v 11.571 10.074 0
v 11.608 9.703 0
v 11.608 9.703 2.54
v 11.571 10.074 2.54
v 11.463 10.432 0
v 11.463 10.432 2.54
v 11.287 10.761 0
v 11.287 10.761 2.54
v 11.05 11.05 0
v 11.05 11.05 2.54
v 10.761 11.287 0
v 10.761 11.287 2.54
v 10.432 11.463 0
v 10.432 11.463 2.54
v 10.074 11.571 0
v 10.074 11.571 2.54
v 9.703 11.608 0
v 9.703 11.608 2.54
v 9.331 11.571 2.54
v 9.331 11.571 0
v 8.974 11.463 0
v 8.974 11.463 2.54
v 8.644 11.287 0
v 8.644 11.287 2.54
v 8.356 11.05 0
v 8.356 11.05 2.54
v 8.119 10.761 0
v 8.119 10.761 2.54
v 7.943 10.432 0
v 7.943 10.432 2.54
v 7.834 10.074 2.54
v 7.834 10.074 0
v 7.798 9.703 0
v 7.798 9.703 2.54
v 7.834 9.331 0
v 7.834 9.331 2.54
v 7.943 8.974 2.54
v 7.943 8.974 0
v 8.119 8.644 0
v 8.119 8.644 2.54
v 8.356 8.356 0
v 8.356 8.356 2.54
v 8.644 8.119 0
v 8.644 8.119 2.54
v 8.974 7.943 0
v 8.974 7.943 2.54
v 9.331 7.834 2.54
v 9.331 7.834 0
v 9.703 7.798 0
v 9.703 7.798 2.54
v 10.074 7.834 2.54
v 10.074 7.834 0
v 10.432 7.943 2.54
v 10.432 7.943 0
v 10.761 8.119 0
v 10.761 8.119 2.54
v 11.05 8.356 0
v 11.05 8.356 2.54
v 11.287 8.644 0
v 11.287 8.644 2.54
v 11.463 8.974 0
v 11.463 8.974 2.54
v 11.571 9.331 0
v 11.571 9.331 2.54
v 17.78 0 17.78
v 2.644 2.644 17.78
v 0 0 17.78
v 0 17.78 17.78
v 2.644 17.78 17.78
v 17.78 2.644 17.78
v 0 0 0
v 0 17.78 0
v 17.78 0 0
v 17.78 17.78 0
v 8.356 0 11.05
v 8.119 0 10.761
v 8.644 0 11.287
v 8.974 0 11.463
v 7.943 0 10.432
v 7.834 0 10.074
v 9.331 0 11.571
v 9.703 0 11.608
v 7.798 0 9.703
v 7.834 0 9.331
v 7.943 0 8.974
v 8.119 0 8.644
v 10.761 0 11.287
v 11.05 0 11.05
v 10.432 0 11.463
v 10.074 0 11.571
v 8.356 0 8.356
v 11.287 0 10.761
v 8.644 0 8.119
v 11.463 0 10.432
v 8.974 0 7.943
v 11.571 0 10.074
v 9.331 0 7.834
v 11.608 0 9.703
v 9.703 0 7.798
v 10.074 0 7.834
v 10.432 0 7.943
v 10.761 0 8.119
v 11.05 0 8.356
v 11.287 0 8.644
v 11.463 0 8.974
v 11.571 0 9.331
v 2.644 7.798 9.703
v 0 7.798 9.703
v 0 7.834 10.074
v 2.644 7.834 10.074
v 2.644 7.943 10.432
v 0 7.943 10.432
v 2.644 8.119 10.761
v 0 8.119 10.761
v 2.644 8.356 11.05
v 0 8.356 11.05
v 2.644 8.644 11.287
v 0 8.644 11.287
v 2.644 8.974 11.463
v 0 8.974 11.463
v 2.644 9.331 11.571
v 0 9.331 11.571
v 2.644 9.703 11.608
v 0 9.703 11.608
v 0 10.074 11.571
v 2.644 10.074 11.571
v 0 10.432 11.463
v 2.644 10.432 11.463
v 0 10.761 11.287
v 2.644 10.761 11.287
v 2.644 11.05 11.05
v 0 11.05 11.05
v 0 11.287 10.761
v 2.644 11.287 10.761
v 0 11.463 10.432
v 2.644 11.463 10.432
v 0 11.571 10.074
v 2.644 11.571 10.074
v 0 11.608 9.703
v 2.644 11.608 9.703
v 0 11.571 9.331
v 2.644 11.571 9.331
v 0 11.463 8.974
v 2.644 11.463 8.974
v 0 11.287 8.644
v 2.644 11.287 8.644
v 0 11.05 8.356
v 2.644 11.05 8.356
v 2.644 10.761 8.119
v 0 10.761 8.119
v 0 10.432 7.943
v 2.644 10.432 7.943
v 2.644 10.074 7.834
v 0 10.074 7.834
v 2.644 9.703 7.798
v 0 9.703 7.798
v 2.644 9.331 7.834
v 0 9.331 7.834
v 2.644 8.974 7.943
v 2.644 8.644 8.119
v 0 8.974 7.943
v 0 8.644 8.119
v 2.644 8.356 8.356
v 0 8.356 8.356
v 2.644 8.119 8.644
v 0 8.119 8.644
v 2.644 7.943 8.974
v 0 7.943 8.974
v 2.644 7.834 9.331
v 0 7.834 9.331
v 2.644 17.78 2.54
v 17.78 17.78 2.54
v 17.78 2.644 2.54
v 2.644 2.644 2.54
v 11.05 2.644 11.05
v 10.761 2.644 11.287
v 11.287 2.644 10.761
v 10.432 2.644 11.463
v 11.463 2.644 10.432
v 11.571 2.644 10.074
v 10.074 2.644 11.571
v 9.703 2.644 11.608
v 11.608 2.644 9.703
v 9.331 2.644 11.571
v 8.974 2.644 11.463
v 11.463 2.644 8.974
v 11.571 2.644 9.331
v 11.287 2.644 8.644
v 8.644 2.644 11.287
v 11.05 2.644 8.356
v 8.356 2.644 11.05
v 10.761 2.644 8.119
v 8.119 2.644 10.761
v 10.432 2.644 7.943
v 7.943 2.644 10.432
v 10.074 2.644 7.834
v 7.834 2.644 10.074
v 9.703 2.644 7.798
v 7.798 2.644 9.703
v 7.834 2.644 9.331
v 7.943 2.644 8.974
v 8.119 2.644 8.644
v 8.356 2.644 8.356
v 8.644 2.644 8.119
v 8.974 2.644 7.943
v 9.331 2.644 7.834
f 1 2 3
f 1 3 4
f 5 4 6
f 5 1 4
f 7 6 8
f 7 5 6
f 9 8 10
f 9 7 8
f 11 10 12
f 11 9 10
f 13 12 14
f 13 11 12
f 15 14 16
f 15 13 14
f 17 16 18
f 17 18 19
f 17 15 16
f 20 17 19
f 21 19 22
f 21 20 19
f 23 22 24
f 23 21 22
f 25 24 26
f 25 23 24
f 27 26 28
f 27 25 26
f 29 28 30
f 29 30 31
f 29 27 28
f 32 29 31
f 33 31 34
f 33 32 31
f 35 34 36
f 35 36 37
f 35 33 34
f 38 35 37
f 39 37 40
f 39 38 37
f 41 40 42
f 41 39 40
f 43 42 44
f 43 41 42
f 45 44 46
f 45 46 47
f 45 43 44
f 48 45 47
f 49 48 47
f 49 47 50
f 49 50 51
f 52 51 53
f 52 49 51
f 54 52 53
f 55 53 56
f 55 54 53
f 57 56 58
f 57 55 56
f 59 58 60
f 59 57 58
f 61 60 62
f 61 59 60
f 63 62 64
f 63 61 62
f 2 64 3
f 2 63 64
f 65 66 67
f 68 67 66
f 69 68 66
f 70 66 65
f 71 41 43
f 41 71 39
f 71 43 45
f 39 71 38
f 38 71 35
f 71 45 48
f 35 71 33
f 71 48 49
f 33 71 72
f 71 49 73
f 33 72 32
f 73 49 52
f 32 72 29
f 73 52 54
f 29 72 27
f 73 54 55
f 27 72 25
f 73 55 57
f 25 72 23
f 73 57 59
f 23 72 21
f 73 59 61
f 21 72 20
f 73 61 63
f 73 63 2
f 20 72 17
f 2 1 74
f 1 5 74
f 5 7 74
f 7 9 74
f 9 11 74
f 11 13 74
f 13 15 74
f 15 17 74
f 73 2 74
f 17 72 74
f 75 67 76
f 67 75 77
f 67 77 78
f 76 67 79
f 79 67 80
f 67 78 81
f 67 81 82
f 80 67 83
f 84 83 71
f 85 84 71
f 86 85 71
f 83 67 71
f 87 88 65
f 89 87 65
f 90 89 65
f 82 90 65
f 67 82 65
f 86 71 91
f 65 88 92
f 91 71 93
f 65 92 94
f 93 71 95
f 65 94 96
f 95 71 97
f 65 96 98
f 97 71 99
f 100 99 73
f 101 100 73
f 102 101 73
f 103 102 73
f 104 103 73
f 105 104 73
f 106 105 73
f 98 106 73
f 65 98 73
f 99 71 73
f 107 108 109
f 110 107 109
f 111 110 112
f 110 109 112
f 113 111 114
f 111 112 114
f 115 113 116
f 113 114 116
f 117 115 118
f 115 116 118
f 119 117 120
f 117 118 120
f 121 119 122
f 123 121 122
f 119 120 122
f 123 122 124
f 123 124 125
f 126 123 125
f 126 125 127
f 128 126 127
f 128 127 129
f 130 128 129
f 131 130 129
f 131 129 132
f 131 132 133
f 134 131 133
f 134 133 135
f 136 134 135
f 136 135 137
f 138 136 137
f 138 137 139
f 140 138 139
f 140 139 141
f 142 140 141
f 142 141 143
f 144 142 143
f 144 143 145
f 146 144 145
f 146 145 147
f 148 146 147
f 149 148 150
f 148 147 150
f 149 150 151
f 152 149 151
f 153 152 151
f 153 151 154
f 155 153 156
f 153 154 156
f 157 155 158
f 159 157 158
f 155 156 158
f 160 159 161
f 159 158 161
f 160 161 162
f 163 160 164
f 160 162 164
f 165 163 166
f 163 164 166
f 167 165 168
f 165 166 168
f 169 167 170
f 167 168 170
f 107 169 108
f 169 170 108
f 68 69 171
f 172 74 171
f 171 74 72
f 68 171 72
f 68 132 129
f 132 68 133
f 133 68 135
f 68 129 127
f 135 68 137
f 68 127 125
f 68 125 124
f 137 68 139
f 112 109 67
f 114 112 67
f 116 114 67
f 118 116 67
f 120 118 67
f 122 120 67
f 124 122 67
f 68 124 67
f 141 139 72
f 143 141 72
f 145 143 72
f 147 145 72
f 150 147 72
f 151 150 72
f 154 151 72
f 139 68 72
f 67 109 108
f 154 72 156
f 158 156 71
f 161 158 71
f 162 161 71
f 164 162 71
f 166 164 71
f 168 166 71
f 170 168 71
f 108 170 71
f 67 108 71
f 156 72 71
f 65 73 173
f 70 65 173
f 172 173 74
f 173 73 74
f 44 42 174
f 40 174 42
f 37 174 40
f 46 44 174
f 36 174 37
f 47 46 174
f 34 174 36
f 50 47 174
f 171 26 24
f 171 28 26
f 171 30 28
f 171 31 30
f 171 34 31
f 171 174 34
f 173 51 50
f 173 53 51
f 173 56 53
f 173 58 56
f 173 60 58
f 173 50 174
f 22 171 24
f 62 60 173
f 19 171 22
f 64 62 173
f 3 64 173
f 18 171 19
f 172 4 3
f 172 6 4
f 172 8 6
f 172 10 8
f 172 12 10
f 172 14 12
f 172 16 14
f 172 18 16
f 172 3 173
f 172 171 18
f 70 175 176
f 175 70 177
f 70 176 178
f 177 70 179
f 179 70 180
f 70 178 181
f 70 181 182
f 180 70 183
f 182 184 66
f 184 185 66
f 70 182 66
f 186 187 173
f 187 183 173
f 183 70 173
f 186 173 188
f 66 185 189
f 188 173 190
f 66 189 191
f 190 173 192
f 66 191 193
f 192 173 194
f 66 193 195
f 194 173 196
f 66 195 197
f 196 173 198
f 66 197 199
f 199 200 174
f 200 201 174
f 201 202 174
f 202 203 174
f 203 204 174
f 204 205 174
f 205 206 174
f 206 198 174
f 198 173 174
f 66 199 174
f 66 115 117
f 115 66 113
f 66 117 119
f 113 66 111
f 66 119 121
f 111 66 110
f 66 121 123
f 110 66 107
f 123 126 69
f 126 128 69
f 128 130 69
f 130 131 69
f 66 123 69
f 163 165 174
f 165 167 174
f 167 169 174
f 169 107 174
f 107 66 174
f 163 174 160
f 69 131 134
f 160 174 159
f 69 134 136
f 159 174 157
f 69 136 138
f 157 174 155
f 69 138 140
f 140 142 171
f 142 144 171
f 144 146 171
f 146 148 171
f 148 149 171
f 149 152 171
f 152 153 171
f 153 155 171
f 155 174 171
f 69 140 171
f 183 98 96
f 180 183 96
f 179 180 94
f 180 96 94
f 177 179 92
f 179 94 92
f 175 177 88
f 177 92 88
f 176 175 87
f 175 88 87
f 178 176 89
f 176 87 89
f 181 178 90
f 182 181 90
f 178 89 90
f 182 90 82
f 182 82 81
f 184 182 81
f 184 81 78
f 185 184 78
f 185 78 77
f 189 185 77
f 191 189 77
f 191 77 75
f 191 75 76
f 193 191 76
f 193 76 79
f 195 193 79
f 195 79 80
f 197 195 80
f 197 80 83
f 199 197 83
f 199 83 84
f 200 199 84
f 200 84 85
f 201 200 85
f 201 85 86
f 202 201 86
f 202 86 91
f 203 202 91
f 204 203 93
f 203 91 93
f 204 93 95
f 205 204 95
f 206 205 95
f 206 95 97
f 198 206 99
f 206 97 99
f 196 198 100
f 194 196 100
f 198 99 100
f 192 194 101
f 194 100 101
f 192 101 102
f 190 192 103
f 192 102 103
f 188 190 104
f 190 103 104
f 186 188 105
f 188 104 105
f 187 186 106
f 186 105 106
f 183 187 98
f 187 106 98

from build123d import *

# Parameters (mm, degrees)
F0_W     = 17.78
F0_H     = 17.78
F0_R     = 1.905
F1_DEPTH = 2.54
F3_DEPTH = 12.7
F4_R     = 1.905
F5_DEPTH = 25.4
F6_R     = 1.905
F7_DEPTH = 25.4
F8_DEPTH = 2.54


with BuildPart() as f1:
    # F0 (on Top) → F1 (new body)
    with BuildSketch(Plane.XY):
        with Locations((8.89, 8.89)):
            Rectangle(F0_W, F0_H)
        with Locations((9.7028, 9.7028)):
            Circle(F0_R, mode=Mode.SUBTRACT)
    extrude(amount=F1_DEPTH)

    # F2 (on face) → F3 (join)
    with BuildSketch(Plane.XY.offset(2.54)):
        Polygon((2.6436052285, 17.78), (0, 17.78), (0, 0), (17.78, 0), (17.78, 2.6436052285), (2.6436052285, 2.6436052285), align=None)
    extrude(amount=F3_DEPTH)

    # F4 (on face) → F5 (cut)
    with BuildSketch(Plane.XZ):
        with Locations((9.7028, 9.7028)):
            Circle(F4_R)
    extrude(amount=-F5_DEPTH, mode=Mode.SUBTRACT)

    # F6 (on face) → F7 (cut)
    with BuildSketch(Plane(origin=(0, 0, 0), x_dir=(0, -1, 0), z_dir=(-1, 0, 0))):
        with Locations((-9.7028, 9.7028)):
            Circle(F6_R)
    extrude(amount=-F7_DEPTH, mode=Mode.SUBTRACT)

    # F8 (add): a face of the model
    f8_faces = [f1.faces().sort_by_distance(p)[0] for p in [
        (2.3921580571, 10.2118026143, 15.24),
    ]]
    extrude(f8_faces, amount=F8_DEPTH)


solid = f1.part
